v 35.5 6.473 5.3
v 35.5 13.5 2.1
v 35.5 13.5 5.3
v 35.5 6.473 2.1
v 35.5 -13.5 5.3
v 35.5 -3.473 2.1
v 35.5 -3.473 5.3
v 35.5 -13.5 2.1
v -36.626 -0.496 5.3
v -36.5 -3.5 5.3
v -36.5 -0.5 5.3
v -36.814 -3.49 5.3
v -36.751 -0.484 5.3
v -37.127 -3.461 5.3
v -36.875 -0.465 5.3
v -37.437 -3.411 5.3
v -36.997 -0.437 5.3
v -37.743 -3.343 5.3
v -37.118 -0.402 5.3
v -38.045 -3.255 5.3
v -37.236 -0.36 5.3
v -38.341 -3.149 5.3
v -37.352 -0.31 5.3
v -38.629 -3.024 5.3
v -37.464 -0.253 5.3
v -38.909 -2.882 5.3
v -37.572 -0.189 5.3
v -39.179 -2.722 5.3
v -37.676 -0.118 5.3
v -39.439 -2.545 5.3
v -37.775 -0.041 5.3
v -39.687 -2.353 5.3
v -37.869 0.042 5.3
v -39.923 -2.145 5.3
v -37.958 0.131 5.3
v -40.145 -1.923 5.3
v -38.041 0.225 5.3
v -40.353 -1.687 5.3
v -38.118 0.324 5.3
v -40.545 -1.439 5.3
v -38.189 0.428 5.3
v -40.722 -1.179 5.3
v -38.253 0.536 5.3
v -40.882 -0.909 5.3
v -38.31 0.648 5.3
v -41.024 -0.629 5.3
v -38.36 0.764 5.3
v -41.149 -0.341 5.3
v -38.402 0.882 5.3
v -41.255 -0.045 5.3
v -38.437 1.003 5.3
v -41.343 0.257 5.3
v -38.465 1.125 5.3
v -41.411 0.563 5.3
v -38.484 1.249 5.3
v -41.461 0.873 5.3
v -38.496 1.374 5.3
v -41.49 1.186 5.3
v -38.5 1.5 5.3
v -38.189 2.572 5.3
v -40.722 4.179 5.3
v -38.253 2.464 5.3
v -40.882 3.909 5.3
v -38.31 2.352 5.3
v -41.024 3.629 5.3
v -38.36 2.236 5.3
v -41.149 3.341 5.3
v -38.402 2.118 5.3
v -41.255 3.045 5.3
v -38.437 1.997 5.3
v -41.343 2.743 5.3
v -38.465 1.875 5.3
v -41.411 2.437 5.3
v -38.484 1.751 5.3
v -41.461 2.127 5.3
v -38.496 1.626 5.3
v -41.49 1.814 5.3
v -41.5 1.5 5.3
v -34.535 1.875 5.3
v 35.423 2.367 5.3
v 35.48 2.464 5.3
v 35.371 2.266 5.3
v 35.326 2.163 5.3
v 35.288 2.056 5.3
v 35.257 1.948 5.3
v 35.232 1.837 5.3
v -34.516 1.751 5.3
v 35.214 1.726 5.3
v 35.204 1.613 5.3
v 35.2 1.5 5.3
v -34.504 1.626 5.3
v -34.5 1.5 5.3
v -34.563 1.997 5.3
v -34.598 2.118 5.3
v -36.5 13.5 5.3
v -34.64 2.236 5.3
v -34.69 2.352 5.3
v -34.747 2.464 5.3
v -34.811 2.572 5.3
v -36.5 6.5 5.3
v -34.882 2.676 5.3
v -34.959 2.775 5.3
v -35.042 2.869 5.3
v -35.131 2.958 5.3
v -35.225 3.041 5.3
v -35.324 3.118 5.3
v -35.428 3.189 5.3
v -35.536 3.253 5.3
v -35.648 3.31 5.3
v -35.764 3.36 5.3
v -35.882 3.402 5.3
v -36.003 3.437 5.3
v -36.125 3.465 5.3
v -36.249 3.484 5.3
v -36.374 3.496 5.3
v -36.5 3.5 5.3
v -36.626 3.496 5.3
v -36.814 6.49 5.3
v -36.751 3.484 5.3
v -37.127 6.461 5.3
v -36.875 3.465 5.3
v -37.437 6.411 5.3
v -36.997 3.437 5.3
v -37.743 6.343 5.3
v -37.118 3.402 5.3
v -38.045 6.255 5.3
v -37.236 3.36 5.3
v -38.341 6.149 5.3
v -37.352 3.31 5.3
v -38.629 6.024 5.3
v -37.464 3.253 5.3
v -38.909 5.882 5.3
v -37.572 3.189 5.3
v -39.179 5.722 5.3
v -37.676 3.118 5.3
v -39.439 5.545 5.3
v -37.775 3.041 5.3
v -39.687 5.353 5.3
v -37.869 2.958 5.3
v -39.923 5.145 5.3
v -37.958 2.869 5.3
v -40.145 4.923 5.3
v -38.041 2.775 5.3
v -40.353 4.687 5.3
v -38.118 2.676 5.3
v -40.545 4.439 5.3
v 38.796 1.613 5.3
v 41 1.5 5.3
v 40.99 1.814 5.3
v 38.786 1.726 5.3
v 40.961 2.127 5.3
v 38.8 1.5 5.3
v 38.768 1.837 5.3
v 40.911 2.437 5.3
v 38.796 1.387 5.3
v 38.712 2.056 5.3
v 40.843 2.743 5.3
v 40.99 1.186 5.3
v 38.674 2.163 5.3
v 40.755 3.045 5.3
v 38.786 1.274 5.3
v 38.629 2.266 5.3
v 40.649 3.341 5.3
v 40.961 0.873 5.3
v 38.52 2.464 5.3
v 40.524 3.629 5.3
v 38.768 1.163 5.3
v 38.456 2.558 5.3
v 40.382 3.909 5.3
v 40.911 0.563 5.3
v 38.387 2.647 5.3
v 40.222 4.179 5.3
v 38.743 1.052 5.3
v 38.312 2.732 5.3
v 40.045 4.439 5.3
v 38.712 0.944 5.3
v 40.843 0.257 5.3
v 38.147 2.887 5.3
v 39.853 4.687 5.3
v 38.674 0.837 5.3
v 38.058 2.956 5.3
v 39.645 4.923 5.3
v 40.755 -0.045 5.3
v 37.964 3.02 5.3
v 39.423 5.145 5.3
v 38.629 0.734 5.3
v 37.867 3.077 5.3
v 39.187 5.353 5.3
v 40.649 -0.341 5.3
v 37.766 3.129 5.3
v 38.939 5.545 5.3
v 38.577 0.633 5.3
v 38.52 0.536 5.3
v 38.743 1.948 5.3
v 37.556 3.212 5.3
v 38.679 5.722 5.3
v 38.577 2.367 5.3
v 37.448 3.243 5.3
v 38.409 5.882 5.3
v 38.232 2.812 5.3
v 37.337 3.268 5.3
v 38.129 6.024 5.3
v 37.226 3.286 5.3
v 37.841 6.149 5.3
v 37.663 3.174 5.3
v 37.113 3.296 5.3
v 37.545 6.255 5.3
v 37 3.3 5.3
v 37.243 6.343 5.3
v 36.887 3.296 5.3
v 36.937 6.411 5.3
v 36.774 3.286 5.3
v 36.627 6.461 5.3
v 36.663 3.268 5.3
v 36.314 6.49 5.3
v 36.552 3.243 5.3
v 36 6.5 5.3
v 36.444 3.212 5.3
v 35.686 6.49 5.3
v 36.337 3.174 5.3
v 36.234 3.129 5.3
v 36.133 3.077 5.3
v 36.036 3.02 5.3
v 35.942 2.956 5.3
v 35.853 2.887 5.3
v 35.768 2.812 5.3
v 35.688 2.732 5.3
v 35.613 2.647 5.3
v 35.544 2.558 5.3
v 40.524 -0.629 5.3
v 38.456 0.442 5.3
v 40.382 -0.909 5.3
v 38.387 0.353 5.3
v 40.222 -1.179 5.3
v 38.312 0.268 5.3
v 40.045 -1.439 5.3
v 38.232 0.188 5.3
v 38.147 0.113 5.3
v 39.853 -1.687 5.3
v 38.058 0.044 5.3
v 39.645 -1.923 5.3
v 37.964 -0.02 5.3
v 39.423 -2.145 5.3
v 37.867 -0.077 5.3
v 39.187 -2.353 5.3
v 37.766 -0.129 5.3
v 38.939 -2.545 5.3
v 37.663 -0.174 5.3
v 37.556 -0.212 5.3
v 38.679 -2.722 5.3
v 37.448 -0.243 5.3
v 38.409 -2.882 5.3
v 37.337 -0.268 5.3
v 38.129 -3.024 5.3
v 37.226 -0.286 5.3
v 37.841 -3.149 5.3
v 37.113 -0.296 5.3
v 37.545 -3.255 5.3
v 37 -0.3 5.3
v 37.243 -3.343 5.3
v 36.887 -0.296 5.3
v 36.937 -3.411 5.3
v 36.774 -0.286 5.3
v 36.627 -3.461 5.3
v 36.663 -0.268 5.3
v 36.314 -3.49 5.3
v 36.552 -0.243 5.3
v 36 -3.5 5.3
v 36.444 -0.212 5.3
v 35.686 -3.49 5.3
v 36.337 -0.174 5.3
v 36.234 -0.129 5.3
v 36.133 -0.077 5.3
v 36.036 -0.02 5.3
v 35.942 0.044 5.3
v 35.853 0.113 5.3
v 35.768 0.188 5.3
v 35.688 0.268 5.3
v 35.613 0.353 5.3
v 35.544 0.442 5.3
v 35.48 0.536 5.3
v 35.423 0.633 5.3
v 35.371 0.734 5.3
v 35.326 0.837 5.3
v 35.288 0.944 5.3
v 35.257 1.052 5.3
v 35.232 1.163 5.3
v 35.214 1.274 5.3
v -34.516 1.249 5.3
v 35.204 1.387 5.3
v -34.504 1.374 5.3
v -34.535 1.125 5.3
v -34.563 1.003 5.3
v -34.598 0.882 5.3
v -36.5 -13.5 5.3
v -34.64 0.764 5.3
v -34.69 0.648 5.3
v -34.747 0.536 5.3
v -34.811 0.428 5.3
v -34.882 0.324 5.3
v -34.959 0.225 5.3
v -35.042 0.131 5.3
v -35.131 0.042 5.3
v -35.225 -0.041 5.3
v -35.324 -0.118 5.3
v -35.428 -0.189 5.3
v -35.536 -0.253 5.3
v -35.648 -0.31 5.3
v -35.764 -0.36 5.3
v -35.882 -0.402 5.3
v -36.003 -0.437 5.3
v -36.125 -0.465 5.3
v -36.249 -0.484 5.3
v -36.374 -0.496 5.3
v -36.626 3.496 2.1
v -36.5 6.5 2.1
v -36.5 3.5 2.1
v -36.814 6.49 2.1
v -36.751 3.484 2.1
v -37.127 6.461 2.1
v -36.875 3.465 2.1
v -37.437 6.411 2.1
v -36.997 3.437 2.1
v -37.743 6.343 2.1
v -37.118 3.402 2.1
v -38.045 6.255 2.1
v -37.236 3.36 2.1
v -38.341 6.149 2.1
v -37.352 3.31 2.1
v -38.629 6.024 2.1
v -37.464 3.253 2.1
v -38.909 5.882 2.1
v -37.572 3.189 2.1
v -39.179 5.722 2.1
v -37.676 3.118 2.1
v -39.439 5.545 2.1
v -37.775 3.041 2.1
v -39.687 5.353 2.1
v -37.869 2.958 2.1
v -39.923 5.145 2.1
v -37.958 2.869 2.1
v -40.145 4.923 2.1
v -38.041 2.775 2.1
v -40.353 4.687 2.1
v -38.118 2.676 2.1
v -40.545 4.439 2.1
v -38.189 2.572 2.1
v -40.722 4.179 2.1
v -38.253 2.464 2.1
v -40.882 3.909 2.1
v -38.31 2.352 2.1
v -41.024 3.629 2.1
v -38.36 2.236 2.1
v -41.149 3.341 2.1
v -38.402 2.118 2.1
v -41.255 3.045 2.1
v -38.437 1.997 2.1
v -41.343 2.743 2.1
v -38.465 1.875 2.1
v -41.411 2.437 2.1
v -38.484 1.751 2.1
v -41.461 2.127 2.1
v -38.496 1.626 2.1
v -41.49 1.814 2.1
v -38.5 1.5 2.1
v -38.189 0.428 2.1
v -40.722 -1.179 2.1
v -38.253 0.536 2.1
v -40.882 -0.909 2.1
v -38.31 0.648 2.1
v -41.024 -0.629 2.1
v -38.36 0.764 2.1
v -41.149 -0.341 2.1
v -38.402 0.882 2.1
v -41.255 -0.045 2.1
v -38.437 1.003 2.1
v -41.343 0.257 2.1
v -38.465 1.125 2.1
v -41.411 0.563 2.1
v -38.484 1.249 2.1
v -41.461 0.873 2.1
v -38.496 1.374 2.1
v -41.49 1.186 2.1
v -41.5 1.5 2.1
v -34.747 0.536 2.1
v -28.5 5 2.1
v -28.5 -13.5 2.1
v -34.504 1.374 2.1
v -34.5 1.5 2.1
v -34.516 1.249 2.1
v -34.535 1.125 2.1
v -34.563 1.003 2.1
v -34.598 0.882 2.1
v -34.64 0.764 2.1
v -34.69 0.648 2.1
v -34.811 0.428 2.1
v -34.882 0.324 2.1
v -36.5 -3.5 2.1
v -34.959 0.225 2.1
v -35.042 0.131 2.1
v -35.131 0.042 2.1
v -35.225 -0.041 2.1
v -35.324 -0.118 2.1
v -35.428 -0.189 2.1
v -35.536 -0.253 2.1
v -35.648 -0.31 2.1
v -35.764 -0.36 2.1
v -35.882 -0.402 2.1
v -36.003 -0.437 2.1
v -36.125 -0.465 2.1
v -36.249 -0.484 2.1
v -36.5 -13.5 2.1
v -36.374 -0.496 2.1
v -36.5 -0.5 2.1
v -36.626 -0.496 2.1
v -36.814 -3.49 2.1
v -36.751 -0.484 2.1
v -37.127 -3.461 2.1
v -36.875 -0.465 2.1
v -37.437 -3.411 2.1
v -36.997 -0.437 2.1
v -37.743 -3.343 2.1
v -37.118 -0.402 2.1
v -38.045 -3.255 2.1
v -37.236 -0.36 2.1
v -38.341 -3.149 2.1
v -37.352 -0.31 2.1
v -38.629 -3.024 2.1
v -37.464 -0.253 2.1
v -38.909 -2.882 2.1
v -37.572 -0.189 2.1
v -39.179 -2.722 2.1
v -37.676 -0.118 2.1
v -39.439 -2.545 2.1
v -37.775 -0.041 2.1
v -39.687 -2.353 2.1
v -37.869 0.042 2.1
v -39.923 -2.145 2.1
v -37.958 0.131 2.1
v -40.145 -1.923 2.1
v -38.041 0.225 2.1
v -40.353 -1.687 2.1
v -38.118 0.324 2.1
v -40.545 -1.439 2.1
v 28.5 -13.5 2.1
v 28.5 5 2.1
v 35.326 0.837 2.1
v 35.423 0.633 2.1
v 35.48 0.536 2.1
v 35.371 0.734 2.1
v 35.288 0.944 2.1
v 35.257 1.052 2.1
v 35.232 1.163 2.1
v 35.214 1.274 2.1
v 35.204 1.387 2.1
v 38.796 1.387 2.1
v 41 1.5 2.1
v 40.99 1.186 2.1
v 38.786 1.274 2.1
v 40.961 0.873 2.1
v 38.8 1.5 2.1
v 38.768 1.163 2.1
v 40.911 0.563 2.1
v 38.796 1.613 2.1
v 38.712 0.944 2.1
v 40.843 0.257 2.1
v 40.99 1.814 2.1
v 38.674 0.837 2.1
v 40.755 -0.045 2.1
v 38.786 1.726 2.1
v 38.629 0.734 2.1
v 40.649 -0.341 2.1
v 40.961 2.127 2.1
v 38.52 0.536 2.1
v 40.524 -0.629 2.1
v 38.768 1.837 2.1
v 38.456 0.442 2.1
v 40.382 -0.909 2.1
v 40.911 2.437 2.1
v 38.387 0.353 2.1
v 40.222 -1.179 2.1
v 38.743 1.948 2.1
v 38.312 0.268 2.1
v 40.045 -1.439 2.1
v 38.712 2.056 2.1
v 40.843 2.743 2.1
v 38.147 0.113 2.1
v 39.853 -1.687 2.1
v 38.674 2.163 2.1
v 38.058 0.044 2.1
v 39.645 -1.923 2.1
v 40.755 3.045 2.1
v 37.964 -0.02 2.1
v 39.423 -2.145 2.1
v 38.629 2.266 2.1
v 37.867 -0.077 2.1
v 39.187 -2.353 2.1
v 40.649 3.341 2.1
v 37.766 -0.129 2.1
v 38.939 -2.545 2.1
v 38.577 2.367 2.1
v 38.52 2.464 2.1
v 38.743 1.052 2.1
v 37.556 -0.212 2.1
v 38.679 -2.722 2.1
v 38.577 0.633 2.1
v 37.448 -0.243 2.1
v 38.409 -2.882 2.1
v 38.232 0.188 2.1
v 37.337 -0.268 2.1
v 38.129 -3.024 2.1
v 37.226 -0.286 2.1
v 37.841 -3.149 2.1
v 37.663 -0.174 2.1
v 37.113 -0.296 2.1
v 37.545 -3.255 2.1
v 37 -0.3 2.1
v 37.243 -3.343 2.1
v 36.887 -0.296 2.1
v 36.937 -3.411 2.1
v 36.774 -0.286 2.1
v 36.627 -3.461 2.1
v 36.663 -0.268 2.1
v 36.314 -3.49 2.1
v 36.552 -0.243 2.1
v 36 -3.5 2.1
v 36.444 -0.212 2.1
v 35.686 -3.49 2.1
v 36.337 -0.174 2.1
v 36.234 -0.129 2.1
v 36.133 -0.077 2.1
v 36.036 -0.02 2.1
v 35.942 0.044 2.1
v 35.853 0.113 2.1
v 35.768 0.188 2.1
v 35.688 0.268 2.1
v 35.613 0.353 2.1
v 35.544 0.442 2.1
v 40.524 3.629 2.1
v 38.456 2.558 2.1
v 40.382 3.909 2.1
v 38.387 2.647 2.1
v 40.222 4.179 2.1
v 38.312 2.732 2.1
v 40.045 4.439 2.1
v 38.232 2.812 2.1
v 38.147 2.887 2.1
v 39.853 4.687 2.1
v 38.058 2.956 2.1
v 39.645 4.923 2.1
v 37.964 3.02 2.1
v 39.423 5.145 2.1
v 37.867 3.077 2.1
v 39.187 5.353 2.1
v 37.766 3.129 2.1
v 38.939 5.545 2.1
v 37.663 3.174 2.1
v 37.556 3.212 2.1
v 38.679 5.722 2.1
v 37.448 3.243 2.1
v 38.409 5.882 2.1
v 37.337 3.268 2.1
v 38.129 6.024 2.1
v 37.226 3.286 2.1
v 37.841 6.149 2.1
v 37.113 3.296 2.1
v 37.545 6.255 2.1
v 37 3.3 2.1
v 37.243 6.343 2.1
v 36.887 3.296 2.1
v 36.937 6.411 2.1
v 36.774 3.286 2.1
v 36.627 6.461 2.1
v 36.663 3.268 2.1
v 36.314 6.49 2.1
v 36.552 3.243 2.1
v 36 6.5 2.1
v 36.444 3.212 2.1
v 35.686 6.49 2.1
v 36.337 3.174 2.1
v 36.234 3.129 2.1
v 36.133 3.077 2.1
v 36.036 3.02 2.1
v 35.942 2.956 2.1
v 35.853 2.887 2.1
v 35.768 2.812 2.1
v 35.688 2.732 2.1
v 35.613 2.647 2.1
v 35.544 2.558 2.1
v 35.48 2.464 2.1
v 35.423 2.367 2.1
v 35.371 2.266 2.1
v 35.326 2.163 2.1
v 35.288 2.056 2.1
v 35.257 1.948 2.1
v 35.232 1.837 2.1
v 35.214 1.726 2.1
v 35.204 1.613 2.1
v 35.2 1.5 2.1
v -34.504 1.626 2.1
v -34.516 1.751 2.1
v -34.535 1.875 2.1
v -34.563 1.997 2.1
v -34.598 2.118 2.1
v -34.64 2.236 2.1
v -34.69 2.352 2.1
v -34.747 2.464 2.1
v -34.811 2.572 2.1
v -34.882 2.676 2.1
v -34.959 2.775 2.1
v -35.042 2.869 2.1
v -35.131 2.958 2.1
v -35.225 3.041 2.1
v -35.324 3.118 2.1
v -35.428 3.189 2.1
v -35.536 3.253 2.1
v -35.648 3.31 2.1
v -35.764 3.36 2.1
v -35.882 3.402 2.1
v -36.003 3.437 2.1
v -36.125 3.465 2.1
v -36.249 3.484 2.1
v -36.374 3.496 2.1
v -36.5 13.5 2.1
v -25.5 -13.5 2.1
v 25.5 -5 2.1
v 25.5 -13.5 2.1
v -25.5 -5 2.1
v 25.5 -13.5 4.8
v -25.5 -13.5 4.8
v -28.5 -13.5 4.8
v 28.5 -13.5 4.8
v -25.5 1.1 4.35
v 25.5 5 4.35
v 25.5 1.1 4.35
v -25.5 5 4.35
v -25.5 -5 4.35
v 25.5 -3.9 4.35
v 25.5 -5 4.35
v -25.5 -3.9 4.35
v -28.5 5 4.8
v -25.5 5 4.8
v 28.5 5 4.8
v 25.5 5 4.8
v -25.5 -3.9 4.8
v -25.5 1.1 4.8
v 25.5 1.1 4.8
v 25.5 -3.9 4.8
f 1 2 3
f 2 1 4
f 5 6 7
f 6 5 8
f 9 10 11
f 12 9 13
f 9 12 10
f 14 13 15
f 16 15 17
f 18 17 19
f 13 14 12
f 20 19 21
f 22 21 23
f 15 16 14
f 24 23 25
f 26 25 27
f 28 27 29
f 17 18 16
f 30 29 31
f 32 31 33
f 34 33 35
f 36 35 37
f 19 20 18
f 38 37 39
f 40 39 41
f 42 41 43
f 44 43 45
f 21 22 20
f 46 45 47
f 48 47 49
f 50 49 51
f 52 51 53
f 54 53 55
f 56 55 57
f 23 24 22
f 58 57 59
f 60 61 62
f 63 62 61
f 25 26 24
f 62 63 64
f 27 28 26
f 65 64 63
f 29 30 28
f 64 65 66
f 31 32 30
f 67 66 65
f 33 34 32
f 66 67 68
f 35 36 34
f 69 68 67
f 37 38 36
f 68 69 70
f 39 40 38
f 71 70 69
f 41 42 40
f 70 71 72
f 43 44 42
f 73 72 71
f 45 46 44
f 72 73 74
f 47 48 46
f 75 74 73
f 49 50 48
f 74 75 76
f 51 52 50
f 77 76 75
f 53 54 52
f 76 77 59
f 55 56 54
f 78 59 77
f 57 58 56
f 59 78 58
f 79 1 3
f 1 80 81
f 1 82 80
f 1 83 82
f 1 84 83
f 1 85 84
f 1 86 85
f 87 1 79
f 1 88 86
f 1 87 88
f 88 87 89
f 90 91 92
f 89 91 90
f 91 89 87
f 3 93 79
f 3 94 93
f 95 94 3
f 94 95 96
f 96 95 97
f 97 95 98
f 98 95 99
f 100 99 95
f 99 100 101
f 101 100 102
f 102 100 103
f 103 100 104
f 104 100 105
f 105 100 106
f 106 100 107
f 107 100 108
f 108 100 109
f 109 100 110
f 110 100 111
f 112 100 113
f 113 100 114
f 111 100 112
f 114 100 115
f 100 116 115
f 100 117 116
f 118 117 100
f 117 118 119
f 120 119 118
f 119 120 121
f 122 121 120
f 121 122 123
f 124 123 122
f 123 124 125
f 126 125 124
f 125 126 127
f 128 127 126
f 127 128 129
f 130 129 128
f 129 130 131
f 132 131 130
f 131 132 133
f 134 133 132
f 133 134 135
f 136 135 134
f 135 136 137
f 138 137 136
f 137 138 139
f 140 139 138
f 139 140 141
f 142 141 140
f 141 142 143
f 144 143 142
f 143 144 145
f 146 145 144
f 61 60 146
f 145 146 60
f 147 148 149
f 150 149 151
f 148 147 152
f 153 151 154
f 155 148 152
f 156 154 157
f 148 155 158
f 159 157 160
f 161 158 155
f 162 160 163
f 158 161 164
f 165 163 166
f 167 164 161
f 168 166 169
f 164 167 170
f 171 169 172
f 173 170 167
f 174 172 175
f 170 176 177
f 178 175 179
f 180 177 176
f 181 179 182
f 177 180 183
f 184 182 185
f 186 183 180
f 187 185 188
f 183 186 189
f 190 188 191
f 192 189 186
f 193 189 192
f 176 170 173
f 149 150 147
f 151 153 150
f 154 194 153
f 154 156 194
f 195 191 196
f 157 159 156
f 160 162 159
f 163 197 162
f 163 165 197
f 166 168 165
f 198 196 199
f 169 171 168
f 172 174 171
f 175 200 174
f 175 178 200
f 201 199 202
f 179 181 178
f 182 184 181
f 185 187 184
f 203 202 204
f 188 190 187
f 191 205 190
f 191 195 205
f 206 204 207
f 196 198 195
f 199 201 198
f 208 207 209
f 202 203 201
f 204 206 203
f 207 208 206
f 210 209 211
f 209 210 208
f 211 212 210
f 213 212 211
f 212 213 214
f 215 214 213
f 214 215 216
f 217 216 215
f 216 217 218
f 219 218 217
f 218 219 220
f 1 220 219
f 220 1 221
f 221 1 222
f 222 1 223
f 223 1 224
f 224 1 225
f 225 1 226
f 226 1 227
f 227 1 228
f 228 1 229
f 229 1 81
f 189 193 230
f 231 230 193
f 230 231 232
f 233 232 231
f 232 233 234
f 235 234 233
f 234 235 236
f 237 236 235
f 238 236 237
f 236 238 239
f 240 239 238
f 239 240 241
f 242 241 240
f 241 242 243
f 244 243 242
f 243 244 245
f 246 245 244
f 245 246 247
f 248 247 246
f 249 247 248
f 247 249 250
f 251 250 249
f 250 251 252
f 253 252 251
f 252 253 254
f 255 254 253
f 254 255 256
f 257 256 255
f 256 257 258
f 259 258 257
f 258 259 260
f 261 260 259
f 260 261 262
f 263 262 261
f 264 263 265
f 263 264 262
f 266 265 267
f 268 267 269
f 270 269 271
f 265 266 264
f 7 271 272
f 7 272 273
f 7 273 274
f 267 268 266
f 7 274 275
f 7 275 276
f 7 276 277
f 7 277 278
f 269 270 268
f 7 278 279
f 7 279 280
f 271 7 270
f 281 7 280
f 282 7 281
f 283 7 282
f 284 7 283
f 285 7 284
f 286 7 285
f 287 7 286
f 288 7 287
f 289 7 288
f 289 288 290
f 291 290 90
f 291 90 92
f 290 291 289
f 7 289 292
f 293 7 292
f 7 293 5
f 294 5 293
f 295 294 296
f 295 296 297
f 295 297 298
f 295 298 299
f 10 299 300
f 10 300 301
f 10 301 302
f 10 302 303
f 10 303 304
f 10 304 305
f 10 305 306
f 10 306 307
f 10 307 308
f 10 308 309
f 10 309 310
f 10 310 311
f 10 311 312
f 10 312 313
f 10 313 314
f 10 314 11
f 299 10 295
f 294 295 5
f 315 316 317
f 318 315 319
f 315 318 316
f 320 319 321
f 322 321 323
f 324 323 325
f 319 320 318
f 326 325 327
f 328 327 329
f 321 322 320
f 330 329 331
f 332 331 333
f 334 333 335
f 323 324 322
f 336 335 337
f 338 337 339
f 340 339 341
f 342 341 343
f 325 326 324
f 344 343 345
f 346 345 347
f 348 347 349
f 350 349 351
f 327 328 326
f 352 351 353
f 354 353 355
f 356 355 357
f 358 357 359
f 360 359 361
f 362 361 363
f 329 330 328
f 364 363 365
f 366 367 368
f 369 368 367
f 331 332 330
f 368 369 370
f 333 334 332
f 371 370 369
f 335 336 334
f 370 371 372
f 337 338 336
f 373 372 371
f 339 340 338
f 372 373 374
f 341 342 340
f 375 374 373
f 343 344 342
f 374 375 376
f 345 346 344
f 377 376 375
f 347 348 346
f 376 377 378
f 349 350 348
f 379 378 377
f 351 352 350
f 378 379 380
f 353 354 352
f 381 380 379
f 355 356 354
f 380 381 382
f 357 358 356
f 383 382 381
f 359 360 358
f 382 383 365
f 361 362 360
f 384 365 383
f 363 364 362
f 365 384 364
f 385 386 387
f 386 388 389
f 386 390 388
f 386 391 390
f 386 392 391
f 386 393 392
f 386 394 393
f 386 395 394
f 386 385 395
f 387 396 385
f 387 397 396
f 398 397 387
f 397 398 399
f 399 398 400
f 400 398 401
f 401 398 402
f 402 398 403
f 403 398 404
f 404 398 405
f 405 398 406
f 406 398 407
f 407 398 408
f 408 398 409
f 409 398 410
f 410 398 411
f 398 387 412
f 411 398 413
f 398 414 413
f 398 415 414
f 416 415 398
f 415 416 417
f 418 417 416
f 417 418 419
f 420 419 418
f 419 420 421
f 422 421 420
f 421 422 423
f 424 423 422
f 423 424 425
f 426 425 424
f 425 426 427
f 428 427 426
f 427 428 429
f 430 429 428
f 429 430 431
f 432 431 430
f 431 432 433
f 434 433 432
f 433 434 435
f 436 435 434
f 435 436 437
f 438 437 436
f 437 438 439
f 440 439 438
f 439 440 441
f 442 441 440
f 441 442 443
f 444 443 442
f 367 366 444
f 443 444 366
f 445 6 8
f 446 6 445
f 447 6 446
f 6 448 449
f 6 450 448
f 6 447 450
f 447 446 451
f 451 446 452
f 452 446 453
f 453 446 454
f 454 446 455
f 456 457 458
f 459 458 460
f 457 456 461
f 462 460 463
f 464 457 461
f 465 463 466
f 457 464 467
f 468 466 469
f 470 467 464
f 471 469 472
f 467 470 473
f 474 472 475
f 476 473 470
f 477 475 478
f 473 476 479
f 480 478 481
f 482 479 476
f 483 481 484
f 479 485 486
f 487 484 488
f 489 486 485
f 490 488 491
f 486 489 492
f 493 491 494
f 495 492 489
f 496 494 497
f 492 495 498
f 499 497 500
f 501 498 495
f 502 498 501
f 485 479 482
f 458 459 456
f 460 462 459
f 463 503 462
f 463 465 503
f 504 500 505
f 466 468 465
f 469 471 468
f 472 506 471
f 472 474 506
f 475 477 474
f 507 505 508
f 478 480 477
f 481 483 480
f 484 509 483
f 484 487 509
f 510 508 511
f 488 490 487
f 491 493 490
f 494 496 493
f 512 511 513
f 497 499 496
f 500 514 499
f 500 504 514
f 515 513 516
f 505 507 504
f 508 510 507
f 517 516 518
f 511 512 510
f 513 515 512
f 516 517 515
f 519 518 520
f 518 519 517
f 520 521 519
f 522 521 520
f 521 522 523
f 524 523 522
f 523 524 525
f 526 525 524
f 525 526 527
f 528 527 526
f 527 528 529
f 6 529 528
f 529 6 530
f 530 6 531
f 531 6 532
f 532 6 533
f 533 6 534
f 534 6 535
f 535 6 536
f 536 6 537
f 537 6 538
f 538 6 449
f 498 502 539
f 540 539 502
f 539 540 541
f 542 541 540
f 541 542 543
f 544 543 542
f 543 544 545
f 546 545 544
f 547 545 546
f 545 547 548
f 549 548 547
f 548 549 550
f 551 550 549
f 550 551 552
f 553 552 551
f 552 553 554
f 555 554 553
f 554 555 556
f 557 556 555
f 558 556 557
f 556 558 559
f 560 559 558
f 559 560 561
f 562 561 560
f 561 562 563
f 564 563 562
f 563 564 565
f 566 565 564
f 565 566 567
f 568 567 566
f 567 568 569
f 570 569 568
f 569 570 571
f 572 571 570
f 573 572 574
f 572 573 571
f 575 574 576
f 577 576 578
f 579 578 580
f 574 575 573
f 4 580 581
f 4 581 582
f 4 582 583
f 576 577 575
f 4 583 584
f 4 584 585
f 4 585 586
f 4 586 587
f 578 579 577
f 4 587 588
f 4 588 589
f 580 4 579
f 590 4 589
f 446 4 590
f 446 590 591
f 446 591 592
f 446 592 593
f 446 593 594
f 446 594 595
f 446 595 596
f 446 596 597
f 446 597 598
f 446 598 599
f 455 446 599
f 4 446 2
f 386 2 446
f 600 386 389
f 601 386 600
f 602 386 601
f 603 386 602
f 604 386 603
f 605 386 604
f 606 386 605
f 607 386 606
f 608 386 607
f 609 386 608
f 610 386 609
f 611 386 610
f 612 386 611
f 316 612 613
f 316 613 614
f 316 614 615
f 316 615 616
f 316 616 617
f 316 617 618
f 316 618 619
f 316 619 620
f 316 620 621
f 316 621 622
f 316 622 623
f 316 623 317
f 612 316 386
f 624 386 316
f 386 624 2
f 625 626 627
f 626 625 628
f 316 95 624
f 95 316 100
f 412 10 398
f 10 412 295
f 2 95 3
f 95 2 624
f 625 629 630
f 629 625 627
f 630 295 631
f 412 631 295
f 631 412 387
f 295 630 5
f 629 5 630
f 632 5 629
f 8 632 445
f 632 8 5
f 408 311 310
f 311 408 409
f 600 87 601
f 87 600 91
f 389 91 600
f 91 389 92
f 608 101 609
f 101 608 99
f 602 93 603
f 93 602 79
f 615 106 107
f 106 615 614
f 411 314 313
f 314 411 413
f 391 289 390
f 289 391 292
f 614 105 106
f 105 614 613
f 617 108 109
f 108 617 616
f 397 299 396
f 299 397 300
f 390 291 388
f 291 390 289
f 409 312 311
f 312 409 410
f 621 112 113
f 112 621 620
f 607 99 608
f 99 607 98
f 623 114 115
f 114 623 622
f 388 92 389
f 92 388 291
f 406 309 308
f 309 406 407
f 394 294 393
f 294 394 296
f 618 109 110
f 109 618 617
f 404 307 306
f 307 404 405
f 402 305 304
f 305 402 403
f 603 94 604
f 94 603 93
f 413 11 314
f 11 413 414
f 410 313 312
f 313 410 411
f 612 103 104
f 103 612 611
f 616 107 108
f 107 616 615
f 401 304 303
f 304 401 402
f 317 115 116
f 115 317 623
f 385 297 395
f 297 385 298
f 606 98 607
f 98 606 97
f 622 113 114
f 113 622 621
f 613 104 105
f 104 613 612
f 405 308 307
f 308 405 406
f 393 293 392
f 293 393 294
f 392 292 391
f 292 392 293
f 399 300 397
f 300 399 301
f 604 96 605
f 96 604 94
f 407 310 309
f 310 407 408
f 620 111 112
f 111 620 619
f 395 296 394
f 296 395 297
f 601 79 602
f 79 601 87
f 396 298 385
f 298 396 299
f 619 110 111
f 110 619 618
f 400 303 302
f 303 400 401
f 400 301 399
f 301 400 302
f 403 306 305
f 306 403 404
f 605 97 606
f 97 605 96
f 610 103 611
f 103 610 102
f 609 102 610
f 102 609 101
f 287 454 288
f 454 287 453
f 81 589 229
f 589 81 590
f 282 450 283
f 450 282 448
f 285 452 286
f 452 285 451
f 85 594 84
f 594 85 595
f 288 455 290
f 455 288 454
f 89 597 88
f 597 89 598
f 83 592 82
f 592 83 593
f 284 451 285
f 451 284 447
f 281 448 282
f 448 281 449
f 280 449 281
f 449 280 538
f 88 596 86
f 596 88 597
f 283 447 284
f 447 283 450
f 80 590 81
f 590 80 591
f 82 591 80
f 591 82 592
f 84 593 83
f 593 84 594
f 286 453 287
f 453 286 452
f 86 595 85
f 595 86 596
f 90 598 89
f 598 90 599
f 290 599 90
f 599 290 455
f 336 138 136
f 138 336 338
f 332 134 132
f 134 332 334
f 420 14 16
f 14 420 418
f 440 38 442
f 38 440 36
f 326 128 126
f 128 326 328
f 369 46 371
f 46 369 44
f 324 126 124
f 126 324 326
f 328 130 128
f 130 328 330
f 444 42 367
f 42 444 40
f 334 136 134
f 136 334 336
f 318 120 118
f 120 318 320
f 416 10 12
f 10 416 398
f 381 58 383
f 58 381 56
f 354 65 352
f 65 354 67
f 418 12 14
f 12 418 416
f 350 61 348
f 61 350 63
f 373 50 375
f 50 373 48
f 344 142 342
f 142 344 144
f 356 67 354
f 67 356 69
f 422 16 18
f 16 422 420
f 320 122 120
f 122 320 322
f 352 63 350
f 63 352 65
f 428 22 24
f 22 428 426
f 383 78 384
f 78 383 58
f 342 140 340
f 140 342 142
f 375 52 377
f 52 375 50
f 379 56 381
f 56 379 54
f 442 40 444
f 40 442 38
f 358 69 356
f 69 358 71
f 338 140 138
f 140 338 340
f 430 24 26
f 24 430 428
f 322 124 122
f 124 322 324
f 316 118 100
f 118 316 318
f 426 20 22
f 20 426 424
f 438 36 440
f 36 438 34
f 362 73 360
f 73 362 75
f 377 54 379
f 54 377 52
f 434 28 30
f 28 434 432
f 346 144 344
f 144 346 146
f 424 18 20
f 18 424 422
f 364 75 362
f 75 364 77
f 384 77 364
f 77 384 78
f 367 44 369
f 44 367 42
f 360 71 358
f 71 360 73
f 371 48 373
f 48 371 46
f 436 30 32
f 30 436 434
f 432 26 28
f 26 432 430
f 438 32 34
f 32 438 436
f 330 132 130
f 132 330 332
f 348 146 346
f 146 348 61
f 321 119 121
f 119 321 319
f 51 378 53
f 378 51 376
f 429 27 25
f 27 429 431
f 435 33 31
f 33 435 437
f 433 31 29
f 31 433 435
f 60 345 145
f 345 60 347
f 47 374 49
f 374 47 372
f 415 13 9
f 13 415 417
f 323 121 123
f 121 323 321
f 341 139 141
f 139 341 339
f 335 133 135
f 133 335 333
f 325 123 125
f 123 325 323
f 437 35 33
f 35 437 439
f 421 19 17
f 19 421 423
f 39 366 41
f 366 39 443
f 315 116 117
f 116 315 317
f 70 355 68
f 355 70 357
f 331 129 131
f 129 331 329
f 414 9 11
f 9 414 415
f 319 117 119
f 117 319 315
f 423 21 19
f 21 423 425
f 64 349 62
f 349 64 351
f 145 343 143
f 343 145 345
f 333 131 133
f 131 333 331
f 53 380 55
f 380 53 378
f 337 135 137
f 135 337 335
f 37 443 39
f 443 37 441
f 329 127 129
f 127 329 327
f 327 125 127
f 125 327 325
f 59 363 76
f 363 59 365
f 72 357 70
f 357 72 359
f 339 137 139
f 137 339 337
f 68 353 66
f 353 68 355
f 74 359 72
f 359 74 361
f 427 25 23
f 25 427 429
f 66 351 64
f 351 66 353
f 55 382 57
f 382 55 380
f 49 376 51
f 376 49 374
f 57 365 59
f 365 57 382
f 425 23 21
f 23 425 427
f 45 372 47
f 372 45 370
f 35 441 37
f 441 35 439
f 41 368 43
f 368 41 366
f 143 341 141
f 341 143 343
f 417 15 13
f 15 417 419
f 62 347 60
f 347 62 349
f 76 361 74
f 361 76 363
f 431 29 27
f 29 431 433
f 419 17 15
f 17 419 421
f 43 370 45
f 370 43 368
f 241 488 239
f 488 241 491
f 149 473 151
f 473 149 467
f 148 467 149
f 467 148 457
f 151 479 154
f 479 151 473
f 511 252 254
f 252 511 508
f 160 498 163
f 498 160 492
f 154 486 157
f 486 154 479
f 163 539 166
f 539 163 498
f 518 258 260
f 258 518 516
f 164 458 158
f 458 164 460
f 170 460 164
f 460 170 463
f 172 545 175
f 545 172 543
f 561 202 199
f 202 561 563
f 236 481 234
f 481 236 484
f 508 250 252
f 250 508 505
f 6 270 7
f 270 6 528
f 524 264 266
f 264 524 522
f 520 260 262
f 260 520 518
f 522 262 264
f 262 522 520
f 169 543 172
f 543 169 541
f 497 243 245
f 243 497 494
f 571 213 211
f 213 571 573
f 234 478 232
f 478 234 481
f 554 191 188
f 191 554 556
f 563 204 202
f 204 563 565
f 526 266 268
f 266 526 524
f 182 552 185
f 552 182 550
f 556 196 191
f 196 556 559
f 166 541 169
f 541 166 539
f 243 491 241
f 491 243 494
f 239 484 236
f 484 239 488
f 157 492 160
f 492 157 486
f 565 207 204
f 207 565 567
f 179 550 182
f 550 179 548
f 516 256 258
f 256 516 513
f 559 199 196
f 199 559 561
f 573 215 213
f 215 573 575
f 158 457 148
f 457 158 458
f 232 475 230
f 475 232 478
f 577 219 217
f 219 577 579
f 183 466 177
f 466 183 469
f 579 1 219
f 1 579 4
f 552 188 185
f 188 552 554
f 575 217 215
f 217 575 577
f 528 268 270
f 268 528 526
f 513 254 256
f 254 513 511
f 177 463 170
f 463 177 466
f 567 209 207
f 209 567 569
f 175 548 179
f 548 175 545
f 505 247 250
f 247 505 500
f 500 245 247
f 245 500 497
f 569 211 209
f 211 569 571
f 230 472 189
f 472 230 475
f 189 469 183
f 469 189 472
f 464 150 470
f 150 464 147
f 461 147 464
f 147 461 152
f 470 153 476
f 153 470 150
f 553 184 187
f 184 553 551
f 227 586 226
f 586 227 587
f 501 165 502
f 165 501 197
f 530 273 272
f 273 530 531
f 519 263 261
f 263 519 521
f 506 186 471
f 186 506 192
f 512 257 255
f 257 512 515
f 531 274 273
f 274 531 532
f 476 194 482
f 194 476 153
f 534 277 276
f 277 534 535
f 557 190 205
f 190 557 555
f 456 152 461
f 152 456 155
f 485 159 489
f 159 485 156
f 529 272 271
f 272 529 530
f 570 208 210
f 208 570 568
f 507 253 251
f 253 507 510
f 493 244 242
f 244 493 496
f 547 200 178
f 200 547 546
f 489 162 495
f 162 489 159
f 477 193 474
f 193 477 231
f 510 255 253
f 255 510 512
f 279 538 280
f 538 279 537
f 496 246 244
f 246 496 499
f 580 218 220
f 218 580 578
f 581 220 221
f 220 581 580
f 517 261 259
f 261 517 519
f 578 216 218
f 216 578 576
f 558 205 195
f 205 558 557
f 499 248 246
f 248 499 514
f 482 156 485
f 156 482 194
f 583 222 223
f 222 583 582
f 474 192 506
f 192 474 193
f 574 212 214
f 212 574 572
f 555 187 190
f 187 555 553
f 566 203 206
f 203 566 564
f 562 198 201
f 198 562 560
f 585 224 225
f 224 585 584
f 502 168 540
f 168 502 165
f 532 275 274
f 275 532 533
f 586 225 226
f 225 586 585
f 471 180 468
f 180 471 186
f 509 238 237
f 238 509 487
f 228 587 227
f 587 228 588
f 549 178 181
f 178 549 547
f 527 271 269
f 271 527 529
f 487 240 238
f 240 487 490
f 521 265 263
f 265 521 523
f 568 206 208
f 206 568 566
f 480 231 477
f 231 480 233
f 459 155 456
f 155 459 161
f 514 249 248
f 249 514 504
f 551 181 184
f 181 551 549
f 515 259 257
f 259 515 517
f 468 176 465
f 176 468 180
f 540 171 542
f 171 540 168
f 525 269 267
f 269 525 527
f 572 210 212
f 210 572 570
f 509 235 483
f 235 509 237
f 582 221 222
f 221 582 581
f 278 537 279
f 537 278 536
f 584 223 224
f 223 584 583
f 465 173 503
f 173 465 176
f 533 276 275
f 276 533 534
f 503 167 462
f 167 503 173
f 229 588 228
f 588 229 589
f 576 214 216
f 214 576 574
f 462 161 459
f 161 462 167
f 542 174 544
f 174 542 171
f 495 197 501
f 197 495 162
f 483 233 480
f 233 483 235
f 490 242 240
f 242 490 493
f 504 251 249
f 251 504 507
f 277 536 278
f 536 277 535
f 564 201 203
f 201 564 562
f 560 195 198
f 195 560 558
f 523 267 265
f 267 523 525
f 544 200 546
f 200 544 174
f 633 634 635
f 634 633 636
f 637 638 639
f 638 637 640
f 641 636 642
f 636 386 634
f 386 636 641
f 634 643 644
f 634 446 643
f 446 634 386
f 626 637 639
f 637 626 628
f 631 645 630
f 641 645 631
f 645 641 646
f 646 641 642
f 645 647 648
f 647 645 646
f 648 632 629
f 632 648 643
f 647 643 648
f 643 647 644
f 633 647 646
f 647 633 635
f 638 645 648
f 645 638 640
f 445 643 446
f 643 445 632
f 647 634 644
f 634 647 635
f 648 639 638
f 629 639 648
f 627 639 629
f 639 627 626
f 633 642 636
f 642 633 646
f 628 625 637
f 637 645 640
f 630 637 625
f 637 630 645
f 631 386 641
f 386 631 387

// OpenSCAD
include <parts.scad>;

$fn=100;

module led() {
	translate([0, 0, 3.1])
		cube([54, 10, 2.5], center=true);
		translate([0, 2.5-3.9, 4.3])
			cube([54, 5, 1], center=true);
}

module led_cover() {

	difference() {
	translate([72/2, -43-27/2, 2.1]) {
		// .. upper part
    	difference() {
    		translate([-72.5, 43, 0])
        		cube([72, 27, 3.2]);
   
    	    // drill hole
			translate([-72.5, 58, -15])
				cylinder(r=2, h=60);
 			translate([1, 58, -15])
				cylinder(r=1.8, h=60);

		}
   		 difference() {
		  	translate([-72.5, 58, 0])
				cylinder(r=5, h=3.2);

    	    // drill hole
			translate([-72.5, 58, -15])
				cylinder(r=2, h=60);
 			translate([1, 58, -15])
				cylinder(r=1.8, h=60);
    	}
		difference() {
			translate([0, 58, 0])
				cylinder(r=5, h=3.2);
   	    	// drill hole
			translate([-72.5, 58, -15])
				cylinder(r=2, h=60);
 			translate([1, 58, -15])
				cylinder(r=1.8, h=60);
		}
	}
		led();
		translate([54/2, -5, 2])
			cube([3, 20, 5.6], center=true);
		translate([-54/2, -5, 2])
			cube([3, 20, 5.6], center=true);
	}
}

// led();
led_cover();
